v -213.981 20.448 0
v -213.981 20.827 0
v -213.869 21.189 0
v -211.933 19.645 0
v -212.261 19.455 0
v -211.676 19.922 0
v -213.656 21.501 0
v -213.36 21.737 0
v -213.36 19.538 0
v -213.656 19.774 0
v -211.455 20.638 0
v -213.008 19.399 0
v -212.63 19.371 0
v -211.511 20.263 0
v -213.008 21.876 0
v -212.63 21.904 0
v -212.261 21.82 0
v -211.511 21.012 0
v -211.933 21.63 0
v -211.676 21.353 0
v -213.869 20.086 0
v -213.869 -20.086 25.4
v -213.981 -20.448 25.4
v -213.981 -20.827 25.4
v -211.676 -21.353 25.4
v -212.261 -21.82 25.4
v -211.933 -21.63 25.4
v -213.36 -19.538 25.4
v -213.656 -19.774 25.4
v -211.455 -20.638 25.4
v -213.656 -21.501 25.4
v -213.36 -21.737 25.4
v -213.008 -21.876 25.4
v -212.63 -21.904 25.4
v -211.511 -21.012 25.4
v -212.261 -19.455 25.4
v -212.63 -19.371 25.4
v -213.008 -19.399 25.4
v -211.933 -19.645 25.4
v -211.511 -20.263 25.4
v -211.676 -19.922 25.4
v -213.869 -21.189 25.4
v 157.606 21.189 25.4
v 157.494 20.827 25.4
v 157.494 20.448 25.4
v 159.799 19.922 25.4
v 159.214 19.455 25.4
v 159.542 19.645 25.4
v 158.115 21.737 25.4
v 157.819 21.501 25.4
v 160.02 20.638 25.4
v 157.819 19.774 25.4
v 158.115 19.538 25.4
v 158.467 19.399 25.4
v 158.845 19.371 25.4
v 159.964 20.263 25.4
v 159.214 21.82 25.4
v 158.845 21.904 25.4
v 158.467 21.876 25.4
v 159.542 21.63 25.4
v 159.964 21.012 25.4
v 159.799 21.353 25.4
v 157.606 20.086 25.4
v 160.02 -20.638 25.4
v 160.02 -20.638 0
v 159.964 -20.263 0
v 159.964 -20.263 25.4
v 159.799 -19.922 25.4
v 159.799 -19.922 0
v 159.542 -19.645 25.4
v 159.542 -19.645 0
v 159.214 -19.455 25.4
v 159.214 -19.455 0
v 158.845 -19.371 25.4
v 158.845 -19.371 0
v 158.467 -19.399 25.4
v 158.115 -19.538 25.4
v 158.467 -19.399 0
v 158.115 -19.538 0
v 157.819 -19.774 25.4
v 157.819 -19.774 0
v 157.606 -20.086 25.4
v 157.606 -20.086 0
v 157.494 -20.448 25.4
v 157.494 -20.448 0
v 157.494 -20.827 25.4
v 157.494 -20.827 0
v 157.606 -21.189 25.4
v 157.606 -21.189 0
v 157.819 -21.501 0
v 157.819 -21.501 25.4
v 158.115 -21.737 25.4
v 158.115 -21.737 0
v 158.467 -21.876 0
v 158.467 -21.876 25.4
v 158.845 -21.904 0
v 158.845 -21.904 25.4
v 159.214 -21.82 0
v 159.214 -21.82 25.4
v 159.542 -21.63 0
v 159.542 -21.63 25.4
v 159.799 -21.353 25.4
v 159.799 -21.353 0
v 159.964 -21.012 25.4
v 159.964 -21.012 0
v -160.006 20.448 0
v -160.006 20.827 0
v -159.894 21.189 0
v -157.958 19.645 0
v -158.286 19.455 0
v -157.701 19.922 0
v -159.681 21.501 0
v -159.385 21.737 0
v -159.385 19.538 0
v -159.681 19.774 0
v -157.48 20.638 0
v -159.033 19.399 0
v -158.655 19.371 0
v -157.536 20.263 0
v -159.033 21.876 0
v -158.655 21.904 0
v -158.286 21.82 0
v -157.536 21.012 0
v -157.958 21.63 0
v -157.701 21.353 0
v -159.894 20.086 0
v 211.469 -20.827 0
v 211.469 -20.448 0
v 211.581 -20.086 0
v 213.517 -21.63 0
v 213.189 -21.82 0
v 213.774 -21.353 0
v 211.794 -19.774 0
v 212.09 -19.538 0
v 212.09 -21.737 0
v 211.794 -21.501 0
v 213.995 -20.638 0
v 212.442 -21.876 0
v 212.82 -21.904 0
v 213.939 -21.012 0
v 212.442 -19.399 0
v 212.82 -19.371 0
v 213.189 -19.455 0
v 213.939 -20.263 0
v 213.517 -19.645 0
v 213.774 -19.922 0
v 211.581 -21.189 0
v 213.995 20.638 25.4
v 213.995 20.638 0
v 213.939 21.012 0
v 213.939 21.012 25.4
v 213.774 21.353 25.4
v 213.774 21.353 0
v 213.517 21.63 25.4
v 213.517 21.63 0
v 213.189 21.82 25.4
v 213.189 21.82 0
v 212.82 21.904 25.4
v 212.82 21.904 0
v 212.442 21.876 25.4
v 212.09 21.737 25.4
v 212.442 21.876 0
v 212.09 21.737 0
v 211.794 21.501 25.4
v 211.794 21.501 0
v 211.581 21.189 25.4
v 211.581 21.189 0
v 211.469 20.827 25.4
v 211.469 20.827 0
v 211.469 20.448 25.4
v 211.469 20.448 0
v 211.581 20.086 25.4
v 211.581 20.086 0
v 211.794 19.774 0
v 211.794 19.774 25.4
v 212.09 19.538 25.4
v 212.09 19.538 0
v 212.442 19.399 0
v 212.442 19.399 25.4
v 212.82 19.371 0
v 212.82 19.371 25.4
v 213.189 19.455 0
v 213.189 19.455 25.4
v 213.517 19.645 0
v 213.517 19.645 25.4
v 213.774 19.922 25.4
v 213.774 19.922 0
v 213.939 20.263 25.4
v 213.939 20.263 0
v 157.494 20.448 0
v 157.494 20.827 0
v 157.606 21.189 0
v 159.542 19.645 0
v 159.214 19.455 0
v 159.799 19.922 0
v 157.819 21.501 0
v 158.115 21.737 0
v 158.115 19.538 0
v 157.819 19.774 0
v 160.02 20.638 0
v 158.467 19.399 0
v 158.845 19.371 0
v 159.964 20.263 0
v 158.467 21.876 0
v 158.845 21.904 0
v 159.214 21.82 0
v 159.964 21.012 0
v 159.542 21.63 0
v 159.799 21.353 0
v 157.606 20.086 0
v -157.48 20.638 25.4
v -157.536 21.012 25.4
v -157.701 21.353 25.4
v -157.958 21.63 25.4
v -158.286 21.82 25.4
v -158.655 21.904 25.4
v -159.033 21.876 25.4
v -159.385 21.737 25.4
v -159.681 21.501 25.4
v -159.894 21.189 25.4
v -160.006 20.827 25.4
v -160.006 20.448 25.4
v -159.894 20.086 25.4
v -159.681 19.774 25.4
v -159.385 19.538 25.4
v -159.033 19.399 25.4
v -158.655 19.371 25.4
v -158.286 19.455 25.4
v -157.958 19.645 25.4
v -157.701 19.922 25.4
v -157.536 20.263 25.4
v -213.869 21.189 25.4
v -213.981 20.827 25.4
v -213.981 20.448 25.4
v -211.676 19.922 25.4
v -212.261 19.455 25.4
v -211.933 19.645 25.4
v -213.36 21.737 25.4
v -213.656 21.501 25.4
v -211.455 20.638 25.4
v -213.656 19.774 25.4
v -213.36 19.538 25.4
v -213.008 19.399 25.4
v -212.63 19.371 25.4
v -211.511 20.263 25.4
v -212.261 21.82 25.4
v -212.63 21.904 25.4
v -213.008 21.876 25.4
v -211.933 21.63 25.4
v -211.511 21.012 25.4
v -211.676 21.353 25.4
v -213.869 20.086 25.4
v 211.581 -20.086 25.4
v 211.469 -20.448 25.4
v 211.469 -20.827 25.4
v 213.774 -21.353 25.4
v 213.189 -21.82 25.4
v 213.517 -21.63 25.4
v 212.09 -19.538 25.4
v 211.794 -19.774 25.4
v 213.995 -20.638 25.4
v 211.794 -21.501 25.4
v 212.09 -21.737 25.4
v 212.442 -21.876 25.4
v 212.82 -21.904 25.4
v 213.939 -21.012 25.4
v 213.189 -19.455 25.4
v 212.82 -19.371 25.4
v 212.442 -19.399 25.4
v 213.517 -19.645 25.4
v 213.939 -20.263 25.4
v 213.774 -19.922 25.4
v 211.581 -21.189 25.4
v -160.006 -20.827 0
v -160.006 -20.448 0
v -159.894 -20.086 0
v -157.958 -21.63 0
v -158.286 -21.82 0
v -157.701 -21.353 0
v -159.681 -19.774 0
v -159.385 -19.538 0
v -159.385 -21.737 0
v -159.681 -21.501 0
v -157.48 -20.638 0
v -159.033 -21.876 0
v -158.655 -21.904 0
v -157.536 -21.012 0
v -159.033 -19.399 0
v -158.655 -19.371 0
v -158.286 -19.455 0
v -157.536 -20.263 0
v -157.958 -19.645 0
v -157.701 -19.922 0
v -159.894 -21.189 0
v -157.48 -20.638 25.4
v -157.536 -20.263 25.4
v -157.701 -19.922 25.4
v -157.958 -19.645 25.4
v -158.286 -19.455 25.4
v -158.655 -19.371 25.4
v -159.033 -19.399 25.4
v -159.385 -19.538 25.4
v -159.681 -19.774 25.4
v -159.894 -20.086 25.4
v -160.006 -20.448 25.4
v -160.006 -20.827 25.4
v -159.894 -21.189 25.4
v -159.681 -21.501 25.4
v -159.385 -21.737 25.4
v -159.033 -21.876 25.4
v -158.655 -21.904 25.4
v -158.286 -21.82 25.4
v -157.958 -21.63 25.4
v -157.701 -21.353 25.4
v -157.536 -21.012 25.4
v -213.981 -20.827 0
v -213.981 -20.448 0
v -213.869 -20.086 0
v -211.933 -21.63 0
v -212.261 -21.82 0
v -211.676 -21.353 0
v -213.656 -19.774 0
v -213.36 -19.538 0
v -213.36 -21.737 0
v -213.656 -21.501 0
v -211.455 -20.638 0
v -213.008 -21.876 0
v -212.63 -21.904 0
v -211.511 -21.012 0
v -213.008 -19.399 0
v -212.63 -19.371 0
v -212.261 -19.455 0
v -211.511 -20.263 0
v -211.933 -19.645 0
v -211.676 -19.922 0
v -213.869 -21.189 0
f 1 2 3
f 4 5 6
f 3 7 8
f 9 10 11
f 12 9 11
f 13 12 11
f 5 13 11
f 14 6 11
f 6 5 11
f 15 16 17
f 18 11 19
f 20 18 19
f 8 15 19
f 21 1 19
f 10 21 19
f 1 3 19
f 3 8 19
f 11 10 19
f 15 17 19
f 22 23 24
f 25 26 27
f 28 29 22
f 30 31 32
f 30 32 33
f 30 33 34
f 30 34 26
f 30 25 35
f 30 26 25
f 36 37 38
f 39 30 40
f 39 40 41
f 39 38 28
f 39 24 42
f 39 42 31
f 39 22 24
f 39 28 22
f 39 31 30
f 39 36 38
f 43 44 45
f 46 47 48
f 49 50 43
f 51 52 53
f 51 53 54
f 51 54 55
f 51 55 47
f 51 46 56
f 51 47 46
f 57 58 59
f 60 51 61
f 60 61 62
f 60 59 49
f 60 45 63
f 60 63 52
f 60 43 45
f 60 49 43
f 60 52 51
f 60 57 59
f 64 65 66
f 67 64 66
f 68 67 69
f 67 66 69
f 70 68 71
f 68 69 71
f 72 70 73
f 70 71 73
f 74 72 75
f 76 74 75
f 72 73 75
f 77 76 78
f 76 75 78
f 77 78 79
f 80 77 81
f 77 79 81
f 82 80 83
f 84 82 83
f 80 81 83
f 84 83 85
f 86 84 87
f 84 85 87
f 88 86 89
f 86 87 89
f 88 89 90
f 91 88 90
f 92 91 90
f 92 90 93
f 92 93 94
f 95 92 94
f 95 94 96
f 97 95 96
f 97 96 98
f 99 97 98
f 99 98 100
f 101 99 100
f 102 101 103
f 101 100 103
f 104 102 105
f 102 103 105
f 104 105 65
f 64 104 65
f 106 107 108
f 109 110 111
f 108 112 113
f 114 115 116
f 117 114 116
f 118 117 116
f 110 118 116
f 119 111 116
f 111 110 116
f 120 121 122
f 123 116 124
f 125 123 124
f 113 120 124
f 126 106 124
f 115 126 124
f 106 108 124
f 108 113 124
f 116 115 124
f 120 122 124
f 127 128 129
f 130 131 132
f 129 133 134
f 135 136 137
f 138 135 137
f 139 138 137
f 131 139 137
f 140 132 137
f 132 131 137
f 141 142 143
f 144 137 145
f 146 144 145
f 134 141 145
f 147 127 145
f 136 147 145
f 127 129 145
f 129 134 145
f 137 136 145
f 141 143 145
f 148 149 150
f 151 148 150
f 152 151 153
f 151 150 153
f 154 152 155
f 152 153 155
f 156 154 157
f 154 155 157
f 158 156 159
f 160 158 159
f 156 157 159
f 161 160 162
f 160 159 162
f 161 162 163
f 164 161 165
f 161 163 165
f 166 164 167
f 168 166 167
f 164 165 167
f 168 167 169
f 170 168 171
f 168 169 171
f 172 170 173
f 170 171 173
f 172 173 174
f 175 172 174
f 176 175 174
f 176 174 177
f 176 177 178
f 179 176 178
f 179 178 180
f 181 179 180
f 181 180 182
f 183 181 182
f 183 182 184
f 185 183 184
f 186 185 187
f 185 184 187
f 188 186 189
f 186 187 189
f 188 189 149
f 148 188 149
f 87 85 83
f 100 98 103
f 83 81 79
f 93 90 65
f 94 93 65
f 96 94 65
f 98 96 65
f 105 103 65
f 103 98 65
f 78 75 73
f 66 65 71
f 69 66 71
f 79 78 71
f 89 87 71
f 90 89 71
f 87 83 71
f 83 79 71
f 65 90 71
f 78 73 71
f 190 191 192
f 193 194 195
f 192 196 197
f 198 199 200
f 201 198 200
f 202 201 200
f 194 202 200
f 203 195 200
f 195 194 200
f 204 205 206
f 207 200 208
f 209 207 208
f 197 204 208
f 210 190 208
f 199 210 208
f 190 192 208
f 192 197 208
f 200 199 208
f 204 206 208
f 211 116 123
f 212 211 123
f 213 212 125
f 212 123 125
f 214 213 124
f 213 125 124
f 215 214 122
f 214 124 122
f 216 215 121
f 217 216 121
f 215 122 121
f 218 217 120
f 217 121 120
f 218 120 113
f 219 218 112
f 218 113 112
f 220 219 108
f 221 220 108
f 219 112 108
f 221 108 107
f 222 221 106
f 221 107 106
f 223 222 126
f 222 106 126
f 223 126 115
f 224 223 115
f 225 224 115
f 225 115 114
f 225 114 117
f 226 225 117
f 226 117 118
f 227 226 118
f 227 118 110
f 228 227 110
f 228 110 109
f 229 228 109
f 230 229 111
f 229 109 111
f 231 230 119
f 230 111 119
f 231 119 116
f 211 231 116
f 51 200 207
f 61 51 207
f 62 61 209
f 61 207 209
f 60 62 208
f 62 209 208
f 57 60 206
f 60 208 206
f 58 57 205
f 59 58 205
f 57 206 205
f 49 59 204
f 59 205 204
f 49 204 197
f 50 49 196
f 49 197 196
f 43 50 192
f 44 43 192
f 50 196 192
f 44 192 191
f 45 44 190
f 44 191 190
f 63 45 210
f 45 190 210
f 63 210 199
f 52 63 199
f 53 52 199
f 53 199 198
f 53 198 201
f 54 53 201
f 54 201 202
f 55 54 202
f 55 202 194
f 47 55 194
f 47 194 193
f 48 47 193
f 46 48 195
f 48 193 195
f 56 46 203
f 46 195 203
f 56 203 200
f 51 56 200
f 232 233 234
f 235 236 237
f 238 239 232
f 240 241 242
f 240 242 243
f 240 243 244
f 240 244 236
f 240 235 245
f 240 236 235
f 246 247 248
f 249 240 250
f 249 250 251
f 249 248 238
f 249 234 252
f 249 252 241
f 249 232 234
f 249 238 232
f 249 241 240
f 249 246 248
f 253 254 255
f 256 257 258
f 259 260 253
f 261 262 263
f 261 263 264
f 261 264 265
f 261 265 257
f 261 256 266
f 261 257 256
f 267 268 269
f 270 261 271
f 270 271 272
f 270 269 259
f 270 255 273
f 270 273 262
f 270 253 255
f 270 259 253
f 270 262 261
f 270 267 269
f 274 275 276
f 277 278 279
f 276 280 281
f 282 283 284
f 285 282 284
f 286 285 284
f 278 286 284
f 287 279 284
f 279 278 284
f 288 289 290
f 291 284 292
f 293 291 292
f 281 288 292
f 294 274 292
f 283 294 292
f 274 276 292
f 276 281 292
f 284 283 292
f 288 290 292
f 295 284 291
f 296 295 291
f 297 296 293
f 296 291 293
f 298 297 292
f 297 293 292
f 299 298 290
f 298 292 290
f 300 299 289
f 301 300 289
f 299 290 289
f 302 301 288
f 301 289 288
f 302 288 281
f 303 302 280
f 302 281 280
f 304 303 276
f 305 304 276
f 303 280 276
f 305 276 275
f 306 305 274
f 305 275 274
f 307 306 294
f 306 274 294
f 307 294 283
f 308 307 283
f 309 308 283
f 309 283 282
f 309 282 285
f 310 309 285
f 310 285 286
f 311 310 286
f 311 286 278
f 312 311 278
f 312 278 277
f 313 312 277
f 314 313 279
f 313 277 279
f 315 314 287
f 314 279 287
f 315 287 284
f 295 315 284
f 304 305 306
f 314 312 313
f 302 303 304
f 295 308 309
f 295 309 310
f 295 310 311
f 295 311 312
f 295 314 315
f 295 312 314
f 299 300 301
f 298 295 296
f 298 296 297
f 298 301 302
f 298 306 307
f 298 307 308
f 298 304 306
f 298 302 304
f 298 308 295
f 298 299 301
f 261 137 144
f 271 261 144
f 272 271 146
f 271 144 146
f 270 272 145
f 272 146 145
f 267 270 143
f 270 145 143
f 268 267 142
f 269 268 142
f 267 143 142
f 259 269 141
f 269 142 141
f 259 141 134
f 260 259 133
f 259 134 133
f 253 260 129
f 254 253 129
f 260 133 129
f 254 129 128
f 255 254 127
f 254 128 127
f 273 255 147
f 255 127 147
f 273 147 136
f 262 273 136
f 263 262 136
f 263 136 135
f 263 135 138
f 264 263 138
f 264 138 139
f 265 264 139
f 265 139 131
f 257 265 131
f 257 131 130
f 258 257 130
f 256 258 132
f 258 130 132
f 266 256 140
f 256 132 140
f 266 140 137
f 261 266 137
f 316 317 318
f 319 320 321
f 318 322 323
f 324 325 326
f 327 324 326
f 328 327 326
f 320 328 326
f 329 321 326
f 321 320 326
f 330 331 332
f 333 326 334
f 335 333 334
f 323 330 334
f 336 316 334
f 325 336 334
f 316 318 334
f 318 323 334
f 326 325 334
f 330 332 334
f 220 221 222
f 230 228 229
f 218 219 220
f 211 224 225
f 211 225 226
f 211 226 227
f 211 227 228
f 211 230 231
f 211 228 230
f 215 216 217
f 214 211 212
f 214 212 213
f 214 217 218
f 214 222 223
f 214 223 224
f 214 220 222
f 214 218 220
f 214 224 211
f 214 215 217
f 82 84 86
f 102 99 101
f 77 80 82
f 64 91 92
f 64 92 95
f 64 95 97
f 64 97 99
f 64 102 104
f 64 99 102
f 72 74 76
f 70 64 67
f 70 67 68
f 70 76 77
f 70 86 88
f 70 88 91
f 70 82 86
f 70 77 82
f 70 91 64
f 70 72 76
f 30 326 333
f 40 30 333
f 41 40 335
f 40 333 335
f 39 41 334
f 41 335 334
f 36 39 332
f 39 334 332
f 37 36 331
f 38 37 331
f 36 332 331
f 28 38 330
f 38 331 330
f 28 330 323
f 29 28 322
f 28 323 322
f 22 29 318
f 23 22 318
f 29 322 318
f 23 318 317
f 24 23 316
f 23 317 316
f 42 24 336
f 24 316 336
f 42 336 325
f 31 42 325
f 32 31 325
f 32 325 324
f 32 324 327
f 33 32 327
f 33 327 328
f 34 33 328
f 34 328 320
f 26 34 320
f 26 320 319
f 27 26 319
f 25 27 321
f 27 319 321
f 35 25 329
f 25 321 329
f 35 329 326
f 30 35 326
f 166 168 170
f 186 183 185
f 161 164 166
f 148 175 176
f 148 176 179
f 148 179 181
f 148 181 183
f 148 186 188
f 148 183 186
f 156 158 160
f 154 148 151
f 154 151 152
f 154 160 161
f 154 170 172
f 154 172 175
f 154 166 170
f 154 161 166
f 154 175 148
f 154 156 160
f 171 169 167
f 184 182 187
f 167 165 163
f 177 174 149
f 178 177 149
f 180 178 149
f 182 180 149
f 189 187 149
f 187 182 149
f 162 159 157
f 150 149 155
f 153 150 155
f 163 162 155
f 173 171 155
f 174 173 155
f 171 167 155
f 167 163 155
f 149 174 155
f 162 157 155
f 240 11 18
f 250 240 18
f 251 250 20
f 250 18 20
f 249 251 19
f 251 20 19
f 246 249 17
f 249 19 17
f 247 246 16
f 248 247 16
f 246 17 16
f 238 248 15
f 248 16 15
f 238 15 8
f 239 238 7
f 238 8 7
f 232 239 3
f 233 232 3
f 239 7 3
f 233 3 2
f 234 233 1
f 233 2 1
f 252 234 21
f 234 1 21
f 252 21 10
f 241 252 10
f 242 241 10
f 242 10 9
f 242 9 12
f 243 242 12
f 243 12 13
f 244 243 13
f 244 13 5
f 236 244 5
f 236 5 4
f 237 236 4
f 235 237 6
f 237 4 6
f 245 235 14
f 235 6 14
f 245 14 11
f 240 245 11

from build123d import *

# Parameters (mm, degrees)
F0_R     = 1.27
F1_DEPTH = 25.4


with BuildPart() as f1:
    # F0 (on Top) → F1 (new body)
    with BuildSketch(Plane.XY):
        with Locations((158.75, 20.6375)):
            Circle(F0_R)
        with Locations((-158.75, -20.6375)):
            Circle(F0_R)
        with Locations((212.725, -20.6375)):
            Circle(F0_R)
        with Locations((212.725, 20.6375)):
            Circle(F0_R)
        with Locations((-158.75, 20.6375)):
            Circle(F0_R)
        with Locations((158.75, -20.6375)):
            Circle(F0_R)
        with Locations((-212.725, -20.6375)):
            Circle(F0_R)
        with Locations((-212.725, 20.6375)):
            Circle(F0_R)
    extrude(amount=F1_DEPTH)


solid = f1.part
